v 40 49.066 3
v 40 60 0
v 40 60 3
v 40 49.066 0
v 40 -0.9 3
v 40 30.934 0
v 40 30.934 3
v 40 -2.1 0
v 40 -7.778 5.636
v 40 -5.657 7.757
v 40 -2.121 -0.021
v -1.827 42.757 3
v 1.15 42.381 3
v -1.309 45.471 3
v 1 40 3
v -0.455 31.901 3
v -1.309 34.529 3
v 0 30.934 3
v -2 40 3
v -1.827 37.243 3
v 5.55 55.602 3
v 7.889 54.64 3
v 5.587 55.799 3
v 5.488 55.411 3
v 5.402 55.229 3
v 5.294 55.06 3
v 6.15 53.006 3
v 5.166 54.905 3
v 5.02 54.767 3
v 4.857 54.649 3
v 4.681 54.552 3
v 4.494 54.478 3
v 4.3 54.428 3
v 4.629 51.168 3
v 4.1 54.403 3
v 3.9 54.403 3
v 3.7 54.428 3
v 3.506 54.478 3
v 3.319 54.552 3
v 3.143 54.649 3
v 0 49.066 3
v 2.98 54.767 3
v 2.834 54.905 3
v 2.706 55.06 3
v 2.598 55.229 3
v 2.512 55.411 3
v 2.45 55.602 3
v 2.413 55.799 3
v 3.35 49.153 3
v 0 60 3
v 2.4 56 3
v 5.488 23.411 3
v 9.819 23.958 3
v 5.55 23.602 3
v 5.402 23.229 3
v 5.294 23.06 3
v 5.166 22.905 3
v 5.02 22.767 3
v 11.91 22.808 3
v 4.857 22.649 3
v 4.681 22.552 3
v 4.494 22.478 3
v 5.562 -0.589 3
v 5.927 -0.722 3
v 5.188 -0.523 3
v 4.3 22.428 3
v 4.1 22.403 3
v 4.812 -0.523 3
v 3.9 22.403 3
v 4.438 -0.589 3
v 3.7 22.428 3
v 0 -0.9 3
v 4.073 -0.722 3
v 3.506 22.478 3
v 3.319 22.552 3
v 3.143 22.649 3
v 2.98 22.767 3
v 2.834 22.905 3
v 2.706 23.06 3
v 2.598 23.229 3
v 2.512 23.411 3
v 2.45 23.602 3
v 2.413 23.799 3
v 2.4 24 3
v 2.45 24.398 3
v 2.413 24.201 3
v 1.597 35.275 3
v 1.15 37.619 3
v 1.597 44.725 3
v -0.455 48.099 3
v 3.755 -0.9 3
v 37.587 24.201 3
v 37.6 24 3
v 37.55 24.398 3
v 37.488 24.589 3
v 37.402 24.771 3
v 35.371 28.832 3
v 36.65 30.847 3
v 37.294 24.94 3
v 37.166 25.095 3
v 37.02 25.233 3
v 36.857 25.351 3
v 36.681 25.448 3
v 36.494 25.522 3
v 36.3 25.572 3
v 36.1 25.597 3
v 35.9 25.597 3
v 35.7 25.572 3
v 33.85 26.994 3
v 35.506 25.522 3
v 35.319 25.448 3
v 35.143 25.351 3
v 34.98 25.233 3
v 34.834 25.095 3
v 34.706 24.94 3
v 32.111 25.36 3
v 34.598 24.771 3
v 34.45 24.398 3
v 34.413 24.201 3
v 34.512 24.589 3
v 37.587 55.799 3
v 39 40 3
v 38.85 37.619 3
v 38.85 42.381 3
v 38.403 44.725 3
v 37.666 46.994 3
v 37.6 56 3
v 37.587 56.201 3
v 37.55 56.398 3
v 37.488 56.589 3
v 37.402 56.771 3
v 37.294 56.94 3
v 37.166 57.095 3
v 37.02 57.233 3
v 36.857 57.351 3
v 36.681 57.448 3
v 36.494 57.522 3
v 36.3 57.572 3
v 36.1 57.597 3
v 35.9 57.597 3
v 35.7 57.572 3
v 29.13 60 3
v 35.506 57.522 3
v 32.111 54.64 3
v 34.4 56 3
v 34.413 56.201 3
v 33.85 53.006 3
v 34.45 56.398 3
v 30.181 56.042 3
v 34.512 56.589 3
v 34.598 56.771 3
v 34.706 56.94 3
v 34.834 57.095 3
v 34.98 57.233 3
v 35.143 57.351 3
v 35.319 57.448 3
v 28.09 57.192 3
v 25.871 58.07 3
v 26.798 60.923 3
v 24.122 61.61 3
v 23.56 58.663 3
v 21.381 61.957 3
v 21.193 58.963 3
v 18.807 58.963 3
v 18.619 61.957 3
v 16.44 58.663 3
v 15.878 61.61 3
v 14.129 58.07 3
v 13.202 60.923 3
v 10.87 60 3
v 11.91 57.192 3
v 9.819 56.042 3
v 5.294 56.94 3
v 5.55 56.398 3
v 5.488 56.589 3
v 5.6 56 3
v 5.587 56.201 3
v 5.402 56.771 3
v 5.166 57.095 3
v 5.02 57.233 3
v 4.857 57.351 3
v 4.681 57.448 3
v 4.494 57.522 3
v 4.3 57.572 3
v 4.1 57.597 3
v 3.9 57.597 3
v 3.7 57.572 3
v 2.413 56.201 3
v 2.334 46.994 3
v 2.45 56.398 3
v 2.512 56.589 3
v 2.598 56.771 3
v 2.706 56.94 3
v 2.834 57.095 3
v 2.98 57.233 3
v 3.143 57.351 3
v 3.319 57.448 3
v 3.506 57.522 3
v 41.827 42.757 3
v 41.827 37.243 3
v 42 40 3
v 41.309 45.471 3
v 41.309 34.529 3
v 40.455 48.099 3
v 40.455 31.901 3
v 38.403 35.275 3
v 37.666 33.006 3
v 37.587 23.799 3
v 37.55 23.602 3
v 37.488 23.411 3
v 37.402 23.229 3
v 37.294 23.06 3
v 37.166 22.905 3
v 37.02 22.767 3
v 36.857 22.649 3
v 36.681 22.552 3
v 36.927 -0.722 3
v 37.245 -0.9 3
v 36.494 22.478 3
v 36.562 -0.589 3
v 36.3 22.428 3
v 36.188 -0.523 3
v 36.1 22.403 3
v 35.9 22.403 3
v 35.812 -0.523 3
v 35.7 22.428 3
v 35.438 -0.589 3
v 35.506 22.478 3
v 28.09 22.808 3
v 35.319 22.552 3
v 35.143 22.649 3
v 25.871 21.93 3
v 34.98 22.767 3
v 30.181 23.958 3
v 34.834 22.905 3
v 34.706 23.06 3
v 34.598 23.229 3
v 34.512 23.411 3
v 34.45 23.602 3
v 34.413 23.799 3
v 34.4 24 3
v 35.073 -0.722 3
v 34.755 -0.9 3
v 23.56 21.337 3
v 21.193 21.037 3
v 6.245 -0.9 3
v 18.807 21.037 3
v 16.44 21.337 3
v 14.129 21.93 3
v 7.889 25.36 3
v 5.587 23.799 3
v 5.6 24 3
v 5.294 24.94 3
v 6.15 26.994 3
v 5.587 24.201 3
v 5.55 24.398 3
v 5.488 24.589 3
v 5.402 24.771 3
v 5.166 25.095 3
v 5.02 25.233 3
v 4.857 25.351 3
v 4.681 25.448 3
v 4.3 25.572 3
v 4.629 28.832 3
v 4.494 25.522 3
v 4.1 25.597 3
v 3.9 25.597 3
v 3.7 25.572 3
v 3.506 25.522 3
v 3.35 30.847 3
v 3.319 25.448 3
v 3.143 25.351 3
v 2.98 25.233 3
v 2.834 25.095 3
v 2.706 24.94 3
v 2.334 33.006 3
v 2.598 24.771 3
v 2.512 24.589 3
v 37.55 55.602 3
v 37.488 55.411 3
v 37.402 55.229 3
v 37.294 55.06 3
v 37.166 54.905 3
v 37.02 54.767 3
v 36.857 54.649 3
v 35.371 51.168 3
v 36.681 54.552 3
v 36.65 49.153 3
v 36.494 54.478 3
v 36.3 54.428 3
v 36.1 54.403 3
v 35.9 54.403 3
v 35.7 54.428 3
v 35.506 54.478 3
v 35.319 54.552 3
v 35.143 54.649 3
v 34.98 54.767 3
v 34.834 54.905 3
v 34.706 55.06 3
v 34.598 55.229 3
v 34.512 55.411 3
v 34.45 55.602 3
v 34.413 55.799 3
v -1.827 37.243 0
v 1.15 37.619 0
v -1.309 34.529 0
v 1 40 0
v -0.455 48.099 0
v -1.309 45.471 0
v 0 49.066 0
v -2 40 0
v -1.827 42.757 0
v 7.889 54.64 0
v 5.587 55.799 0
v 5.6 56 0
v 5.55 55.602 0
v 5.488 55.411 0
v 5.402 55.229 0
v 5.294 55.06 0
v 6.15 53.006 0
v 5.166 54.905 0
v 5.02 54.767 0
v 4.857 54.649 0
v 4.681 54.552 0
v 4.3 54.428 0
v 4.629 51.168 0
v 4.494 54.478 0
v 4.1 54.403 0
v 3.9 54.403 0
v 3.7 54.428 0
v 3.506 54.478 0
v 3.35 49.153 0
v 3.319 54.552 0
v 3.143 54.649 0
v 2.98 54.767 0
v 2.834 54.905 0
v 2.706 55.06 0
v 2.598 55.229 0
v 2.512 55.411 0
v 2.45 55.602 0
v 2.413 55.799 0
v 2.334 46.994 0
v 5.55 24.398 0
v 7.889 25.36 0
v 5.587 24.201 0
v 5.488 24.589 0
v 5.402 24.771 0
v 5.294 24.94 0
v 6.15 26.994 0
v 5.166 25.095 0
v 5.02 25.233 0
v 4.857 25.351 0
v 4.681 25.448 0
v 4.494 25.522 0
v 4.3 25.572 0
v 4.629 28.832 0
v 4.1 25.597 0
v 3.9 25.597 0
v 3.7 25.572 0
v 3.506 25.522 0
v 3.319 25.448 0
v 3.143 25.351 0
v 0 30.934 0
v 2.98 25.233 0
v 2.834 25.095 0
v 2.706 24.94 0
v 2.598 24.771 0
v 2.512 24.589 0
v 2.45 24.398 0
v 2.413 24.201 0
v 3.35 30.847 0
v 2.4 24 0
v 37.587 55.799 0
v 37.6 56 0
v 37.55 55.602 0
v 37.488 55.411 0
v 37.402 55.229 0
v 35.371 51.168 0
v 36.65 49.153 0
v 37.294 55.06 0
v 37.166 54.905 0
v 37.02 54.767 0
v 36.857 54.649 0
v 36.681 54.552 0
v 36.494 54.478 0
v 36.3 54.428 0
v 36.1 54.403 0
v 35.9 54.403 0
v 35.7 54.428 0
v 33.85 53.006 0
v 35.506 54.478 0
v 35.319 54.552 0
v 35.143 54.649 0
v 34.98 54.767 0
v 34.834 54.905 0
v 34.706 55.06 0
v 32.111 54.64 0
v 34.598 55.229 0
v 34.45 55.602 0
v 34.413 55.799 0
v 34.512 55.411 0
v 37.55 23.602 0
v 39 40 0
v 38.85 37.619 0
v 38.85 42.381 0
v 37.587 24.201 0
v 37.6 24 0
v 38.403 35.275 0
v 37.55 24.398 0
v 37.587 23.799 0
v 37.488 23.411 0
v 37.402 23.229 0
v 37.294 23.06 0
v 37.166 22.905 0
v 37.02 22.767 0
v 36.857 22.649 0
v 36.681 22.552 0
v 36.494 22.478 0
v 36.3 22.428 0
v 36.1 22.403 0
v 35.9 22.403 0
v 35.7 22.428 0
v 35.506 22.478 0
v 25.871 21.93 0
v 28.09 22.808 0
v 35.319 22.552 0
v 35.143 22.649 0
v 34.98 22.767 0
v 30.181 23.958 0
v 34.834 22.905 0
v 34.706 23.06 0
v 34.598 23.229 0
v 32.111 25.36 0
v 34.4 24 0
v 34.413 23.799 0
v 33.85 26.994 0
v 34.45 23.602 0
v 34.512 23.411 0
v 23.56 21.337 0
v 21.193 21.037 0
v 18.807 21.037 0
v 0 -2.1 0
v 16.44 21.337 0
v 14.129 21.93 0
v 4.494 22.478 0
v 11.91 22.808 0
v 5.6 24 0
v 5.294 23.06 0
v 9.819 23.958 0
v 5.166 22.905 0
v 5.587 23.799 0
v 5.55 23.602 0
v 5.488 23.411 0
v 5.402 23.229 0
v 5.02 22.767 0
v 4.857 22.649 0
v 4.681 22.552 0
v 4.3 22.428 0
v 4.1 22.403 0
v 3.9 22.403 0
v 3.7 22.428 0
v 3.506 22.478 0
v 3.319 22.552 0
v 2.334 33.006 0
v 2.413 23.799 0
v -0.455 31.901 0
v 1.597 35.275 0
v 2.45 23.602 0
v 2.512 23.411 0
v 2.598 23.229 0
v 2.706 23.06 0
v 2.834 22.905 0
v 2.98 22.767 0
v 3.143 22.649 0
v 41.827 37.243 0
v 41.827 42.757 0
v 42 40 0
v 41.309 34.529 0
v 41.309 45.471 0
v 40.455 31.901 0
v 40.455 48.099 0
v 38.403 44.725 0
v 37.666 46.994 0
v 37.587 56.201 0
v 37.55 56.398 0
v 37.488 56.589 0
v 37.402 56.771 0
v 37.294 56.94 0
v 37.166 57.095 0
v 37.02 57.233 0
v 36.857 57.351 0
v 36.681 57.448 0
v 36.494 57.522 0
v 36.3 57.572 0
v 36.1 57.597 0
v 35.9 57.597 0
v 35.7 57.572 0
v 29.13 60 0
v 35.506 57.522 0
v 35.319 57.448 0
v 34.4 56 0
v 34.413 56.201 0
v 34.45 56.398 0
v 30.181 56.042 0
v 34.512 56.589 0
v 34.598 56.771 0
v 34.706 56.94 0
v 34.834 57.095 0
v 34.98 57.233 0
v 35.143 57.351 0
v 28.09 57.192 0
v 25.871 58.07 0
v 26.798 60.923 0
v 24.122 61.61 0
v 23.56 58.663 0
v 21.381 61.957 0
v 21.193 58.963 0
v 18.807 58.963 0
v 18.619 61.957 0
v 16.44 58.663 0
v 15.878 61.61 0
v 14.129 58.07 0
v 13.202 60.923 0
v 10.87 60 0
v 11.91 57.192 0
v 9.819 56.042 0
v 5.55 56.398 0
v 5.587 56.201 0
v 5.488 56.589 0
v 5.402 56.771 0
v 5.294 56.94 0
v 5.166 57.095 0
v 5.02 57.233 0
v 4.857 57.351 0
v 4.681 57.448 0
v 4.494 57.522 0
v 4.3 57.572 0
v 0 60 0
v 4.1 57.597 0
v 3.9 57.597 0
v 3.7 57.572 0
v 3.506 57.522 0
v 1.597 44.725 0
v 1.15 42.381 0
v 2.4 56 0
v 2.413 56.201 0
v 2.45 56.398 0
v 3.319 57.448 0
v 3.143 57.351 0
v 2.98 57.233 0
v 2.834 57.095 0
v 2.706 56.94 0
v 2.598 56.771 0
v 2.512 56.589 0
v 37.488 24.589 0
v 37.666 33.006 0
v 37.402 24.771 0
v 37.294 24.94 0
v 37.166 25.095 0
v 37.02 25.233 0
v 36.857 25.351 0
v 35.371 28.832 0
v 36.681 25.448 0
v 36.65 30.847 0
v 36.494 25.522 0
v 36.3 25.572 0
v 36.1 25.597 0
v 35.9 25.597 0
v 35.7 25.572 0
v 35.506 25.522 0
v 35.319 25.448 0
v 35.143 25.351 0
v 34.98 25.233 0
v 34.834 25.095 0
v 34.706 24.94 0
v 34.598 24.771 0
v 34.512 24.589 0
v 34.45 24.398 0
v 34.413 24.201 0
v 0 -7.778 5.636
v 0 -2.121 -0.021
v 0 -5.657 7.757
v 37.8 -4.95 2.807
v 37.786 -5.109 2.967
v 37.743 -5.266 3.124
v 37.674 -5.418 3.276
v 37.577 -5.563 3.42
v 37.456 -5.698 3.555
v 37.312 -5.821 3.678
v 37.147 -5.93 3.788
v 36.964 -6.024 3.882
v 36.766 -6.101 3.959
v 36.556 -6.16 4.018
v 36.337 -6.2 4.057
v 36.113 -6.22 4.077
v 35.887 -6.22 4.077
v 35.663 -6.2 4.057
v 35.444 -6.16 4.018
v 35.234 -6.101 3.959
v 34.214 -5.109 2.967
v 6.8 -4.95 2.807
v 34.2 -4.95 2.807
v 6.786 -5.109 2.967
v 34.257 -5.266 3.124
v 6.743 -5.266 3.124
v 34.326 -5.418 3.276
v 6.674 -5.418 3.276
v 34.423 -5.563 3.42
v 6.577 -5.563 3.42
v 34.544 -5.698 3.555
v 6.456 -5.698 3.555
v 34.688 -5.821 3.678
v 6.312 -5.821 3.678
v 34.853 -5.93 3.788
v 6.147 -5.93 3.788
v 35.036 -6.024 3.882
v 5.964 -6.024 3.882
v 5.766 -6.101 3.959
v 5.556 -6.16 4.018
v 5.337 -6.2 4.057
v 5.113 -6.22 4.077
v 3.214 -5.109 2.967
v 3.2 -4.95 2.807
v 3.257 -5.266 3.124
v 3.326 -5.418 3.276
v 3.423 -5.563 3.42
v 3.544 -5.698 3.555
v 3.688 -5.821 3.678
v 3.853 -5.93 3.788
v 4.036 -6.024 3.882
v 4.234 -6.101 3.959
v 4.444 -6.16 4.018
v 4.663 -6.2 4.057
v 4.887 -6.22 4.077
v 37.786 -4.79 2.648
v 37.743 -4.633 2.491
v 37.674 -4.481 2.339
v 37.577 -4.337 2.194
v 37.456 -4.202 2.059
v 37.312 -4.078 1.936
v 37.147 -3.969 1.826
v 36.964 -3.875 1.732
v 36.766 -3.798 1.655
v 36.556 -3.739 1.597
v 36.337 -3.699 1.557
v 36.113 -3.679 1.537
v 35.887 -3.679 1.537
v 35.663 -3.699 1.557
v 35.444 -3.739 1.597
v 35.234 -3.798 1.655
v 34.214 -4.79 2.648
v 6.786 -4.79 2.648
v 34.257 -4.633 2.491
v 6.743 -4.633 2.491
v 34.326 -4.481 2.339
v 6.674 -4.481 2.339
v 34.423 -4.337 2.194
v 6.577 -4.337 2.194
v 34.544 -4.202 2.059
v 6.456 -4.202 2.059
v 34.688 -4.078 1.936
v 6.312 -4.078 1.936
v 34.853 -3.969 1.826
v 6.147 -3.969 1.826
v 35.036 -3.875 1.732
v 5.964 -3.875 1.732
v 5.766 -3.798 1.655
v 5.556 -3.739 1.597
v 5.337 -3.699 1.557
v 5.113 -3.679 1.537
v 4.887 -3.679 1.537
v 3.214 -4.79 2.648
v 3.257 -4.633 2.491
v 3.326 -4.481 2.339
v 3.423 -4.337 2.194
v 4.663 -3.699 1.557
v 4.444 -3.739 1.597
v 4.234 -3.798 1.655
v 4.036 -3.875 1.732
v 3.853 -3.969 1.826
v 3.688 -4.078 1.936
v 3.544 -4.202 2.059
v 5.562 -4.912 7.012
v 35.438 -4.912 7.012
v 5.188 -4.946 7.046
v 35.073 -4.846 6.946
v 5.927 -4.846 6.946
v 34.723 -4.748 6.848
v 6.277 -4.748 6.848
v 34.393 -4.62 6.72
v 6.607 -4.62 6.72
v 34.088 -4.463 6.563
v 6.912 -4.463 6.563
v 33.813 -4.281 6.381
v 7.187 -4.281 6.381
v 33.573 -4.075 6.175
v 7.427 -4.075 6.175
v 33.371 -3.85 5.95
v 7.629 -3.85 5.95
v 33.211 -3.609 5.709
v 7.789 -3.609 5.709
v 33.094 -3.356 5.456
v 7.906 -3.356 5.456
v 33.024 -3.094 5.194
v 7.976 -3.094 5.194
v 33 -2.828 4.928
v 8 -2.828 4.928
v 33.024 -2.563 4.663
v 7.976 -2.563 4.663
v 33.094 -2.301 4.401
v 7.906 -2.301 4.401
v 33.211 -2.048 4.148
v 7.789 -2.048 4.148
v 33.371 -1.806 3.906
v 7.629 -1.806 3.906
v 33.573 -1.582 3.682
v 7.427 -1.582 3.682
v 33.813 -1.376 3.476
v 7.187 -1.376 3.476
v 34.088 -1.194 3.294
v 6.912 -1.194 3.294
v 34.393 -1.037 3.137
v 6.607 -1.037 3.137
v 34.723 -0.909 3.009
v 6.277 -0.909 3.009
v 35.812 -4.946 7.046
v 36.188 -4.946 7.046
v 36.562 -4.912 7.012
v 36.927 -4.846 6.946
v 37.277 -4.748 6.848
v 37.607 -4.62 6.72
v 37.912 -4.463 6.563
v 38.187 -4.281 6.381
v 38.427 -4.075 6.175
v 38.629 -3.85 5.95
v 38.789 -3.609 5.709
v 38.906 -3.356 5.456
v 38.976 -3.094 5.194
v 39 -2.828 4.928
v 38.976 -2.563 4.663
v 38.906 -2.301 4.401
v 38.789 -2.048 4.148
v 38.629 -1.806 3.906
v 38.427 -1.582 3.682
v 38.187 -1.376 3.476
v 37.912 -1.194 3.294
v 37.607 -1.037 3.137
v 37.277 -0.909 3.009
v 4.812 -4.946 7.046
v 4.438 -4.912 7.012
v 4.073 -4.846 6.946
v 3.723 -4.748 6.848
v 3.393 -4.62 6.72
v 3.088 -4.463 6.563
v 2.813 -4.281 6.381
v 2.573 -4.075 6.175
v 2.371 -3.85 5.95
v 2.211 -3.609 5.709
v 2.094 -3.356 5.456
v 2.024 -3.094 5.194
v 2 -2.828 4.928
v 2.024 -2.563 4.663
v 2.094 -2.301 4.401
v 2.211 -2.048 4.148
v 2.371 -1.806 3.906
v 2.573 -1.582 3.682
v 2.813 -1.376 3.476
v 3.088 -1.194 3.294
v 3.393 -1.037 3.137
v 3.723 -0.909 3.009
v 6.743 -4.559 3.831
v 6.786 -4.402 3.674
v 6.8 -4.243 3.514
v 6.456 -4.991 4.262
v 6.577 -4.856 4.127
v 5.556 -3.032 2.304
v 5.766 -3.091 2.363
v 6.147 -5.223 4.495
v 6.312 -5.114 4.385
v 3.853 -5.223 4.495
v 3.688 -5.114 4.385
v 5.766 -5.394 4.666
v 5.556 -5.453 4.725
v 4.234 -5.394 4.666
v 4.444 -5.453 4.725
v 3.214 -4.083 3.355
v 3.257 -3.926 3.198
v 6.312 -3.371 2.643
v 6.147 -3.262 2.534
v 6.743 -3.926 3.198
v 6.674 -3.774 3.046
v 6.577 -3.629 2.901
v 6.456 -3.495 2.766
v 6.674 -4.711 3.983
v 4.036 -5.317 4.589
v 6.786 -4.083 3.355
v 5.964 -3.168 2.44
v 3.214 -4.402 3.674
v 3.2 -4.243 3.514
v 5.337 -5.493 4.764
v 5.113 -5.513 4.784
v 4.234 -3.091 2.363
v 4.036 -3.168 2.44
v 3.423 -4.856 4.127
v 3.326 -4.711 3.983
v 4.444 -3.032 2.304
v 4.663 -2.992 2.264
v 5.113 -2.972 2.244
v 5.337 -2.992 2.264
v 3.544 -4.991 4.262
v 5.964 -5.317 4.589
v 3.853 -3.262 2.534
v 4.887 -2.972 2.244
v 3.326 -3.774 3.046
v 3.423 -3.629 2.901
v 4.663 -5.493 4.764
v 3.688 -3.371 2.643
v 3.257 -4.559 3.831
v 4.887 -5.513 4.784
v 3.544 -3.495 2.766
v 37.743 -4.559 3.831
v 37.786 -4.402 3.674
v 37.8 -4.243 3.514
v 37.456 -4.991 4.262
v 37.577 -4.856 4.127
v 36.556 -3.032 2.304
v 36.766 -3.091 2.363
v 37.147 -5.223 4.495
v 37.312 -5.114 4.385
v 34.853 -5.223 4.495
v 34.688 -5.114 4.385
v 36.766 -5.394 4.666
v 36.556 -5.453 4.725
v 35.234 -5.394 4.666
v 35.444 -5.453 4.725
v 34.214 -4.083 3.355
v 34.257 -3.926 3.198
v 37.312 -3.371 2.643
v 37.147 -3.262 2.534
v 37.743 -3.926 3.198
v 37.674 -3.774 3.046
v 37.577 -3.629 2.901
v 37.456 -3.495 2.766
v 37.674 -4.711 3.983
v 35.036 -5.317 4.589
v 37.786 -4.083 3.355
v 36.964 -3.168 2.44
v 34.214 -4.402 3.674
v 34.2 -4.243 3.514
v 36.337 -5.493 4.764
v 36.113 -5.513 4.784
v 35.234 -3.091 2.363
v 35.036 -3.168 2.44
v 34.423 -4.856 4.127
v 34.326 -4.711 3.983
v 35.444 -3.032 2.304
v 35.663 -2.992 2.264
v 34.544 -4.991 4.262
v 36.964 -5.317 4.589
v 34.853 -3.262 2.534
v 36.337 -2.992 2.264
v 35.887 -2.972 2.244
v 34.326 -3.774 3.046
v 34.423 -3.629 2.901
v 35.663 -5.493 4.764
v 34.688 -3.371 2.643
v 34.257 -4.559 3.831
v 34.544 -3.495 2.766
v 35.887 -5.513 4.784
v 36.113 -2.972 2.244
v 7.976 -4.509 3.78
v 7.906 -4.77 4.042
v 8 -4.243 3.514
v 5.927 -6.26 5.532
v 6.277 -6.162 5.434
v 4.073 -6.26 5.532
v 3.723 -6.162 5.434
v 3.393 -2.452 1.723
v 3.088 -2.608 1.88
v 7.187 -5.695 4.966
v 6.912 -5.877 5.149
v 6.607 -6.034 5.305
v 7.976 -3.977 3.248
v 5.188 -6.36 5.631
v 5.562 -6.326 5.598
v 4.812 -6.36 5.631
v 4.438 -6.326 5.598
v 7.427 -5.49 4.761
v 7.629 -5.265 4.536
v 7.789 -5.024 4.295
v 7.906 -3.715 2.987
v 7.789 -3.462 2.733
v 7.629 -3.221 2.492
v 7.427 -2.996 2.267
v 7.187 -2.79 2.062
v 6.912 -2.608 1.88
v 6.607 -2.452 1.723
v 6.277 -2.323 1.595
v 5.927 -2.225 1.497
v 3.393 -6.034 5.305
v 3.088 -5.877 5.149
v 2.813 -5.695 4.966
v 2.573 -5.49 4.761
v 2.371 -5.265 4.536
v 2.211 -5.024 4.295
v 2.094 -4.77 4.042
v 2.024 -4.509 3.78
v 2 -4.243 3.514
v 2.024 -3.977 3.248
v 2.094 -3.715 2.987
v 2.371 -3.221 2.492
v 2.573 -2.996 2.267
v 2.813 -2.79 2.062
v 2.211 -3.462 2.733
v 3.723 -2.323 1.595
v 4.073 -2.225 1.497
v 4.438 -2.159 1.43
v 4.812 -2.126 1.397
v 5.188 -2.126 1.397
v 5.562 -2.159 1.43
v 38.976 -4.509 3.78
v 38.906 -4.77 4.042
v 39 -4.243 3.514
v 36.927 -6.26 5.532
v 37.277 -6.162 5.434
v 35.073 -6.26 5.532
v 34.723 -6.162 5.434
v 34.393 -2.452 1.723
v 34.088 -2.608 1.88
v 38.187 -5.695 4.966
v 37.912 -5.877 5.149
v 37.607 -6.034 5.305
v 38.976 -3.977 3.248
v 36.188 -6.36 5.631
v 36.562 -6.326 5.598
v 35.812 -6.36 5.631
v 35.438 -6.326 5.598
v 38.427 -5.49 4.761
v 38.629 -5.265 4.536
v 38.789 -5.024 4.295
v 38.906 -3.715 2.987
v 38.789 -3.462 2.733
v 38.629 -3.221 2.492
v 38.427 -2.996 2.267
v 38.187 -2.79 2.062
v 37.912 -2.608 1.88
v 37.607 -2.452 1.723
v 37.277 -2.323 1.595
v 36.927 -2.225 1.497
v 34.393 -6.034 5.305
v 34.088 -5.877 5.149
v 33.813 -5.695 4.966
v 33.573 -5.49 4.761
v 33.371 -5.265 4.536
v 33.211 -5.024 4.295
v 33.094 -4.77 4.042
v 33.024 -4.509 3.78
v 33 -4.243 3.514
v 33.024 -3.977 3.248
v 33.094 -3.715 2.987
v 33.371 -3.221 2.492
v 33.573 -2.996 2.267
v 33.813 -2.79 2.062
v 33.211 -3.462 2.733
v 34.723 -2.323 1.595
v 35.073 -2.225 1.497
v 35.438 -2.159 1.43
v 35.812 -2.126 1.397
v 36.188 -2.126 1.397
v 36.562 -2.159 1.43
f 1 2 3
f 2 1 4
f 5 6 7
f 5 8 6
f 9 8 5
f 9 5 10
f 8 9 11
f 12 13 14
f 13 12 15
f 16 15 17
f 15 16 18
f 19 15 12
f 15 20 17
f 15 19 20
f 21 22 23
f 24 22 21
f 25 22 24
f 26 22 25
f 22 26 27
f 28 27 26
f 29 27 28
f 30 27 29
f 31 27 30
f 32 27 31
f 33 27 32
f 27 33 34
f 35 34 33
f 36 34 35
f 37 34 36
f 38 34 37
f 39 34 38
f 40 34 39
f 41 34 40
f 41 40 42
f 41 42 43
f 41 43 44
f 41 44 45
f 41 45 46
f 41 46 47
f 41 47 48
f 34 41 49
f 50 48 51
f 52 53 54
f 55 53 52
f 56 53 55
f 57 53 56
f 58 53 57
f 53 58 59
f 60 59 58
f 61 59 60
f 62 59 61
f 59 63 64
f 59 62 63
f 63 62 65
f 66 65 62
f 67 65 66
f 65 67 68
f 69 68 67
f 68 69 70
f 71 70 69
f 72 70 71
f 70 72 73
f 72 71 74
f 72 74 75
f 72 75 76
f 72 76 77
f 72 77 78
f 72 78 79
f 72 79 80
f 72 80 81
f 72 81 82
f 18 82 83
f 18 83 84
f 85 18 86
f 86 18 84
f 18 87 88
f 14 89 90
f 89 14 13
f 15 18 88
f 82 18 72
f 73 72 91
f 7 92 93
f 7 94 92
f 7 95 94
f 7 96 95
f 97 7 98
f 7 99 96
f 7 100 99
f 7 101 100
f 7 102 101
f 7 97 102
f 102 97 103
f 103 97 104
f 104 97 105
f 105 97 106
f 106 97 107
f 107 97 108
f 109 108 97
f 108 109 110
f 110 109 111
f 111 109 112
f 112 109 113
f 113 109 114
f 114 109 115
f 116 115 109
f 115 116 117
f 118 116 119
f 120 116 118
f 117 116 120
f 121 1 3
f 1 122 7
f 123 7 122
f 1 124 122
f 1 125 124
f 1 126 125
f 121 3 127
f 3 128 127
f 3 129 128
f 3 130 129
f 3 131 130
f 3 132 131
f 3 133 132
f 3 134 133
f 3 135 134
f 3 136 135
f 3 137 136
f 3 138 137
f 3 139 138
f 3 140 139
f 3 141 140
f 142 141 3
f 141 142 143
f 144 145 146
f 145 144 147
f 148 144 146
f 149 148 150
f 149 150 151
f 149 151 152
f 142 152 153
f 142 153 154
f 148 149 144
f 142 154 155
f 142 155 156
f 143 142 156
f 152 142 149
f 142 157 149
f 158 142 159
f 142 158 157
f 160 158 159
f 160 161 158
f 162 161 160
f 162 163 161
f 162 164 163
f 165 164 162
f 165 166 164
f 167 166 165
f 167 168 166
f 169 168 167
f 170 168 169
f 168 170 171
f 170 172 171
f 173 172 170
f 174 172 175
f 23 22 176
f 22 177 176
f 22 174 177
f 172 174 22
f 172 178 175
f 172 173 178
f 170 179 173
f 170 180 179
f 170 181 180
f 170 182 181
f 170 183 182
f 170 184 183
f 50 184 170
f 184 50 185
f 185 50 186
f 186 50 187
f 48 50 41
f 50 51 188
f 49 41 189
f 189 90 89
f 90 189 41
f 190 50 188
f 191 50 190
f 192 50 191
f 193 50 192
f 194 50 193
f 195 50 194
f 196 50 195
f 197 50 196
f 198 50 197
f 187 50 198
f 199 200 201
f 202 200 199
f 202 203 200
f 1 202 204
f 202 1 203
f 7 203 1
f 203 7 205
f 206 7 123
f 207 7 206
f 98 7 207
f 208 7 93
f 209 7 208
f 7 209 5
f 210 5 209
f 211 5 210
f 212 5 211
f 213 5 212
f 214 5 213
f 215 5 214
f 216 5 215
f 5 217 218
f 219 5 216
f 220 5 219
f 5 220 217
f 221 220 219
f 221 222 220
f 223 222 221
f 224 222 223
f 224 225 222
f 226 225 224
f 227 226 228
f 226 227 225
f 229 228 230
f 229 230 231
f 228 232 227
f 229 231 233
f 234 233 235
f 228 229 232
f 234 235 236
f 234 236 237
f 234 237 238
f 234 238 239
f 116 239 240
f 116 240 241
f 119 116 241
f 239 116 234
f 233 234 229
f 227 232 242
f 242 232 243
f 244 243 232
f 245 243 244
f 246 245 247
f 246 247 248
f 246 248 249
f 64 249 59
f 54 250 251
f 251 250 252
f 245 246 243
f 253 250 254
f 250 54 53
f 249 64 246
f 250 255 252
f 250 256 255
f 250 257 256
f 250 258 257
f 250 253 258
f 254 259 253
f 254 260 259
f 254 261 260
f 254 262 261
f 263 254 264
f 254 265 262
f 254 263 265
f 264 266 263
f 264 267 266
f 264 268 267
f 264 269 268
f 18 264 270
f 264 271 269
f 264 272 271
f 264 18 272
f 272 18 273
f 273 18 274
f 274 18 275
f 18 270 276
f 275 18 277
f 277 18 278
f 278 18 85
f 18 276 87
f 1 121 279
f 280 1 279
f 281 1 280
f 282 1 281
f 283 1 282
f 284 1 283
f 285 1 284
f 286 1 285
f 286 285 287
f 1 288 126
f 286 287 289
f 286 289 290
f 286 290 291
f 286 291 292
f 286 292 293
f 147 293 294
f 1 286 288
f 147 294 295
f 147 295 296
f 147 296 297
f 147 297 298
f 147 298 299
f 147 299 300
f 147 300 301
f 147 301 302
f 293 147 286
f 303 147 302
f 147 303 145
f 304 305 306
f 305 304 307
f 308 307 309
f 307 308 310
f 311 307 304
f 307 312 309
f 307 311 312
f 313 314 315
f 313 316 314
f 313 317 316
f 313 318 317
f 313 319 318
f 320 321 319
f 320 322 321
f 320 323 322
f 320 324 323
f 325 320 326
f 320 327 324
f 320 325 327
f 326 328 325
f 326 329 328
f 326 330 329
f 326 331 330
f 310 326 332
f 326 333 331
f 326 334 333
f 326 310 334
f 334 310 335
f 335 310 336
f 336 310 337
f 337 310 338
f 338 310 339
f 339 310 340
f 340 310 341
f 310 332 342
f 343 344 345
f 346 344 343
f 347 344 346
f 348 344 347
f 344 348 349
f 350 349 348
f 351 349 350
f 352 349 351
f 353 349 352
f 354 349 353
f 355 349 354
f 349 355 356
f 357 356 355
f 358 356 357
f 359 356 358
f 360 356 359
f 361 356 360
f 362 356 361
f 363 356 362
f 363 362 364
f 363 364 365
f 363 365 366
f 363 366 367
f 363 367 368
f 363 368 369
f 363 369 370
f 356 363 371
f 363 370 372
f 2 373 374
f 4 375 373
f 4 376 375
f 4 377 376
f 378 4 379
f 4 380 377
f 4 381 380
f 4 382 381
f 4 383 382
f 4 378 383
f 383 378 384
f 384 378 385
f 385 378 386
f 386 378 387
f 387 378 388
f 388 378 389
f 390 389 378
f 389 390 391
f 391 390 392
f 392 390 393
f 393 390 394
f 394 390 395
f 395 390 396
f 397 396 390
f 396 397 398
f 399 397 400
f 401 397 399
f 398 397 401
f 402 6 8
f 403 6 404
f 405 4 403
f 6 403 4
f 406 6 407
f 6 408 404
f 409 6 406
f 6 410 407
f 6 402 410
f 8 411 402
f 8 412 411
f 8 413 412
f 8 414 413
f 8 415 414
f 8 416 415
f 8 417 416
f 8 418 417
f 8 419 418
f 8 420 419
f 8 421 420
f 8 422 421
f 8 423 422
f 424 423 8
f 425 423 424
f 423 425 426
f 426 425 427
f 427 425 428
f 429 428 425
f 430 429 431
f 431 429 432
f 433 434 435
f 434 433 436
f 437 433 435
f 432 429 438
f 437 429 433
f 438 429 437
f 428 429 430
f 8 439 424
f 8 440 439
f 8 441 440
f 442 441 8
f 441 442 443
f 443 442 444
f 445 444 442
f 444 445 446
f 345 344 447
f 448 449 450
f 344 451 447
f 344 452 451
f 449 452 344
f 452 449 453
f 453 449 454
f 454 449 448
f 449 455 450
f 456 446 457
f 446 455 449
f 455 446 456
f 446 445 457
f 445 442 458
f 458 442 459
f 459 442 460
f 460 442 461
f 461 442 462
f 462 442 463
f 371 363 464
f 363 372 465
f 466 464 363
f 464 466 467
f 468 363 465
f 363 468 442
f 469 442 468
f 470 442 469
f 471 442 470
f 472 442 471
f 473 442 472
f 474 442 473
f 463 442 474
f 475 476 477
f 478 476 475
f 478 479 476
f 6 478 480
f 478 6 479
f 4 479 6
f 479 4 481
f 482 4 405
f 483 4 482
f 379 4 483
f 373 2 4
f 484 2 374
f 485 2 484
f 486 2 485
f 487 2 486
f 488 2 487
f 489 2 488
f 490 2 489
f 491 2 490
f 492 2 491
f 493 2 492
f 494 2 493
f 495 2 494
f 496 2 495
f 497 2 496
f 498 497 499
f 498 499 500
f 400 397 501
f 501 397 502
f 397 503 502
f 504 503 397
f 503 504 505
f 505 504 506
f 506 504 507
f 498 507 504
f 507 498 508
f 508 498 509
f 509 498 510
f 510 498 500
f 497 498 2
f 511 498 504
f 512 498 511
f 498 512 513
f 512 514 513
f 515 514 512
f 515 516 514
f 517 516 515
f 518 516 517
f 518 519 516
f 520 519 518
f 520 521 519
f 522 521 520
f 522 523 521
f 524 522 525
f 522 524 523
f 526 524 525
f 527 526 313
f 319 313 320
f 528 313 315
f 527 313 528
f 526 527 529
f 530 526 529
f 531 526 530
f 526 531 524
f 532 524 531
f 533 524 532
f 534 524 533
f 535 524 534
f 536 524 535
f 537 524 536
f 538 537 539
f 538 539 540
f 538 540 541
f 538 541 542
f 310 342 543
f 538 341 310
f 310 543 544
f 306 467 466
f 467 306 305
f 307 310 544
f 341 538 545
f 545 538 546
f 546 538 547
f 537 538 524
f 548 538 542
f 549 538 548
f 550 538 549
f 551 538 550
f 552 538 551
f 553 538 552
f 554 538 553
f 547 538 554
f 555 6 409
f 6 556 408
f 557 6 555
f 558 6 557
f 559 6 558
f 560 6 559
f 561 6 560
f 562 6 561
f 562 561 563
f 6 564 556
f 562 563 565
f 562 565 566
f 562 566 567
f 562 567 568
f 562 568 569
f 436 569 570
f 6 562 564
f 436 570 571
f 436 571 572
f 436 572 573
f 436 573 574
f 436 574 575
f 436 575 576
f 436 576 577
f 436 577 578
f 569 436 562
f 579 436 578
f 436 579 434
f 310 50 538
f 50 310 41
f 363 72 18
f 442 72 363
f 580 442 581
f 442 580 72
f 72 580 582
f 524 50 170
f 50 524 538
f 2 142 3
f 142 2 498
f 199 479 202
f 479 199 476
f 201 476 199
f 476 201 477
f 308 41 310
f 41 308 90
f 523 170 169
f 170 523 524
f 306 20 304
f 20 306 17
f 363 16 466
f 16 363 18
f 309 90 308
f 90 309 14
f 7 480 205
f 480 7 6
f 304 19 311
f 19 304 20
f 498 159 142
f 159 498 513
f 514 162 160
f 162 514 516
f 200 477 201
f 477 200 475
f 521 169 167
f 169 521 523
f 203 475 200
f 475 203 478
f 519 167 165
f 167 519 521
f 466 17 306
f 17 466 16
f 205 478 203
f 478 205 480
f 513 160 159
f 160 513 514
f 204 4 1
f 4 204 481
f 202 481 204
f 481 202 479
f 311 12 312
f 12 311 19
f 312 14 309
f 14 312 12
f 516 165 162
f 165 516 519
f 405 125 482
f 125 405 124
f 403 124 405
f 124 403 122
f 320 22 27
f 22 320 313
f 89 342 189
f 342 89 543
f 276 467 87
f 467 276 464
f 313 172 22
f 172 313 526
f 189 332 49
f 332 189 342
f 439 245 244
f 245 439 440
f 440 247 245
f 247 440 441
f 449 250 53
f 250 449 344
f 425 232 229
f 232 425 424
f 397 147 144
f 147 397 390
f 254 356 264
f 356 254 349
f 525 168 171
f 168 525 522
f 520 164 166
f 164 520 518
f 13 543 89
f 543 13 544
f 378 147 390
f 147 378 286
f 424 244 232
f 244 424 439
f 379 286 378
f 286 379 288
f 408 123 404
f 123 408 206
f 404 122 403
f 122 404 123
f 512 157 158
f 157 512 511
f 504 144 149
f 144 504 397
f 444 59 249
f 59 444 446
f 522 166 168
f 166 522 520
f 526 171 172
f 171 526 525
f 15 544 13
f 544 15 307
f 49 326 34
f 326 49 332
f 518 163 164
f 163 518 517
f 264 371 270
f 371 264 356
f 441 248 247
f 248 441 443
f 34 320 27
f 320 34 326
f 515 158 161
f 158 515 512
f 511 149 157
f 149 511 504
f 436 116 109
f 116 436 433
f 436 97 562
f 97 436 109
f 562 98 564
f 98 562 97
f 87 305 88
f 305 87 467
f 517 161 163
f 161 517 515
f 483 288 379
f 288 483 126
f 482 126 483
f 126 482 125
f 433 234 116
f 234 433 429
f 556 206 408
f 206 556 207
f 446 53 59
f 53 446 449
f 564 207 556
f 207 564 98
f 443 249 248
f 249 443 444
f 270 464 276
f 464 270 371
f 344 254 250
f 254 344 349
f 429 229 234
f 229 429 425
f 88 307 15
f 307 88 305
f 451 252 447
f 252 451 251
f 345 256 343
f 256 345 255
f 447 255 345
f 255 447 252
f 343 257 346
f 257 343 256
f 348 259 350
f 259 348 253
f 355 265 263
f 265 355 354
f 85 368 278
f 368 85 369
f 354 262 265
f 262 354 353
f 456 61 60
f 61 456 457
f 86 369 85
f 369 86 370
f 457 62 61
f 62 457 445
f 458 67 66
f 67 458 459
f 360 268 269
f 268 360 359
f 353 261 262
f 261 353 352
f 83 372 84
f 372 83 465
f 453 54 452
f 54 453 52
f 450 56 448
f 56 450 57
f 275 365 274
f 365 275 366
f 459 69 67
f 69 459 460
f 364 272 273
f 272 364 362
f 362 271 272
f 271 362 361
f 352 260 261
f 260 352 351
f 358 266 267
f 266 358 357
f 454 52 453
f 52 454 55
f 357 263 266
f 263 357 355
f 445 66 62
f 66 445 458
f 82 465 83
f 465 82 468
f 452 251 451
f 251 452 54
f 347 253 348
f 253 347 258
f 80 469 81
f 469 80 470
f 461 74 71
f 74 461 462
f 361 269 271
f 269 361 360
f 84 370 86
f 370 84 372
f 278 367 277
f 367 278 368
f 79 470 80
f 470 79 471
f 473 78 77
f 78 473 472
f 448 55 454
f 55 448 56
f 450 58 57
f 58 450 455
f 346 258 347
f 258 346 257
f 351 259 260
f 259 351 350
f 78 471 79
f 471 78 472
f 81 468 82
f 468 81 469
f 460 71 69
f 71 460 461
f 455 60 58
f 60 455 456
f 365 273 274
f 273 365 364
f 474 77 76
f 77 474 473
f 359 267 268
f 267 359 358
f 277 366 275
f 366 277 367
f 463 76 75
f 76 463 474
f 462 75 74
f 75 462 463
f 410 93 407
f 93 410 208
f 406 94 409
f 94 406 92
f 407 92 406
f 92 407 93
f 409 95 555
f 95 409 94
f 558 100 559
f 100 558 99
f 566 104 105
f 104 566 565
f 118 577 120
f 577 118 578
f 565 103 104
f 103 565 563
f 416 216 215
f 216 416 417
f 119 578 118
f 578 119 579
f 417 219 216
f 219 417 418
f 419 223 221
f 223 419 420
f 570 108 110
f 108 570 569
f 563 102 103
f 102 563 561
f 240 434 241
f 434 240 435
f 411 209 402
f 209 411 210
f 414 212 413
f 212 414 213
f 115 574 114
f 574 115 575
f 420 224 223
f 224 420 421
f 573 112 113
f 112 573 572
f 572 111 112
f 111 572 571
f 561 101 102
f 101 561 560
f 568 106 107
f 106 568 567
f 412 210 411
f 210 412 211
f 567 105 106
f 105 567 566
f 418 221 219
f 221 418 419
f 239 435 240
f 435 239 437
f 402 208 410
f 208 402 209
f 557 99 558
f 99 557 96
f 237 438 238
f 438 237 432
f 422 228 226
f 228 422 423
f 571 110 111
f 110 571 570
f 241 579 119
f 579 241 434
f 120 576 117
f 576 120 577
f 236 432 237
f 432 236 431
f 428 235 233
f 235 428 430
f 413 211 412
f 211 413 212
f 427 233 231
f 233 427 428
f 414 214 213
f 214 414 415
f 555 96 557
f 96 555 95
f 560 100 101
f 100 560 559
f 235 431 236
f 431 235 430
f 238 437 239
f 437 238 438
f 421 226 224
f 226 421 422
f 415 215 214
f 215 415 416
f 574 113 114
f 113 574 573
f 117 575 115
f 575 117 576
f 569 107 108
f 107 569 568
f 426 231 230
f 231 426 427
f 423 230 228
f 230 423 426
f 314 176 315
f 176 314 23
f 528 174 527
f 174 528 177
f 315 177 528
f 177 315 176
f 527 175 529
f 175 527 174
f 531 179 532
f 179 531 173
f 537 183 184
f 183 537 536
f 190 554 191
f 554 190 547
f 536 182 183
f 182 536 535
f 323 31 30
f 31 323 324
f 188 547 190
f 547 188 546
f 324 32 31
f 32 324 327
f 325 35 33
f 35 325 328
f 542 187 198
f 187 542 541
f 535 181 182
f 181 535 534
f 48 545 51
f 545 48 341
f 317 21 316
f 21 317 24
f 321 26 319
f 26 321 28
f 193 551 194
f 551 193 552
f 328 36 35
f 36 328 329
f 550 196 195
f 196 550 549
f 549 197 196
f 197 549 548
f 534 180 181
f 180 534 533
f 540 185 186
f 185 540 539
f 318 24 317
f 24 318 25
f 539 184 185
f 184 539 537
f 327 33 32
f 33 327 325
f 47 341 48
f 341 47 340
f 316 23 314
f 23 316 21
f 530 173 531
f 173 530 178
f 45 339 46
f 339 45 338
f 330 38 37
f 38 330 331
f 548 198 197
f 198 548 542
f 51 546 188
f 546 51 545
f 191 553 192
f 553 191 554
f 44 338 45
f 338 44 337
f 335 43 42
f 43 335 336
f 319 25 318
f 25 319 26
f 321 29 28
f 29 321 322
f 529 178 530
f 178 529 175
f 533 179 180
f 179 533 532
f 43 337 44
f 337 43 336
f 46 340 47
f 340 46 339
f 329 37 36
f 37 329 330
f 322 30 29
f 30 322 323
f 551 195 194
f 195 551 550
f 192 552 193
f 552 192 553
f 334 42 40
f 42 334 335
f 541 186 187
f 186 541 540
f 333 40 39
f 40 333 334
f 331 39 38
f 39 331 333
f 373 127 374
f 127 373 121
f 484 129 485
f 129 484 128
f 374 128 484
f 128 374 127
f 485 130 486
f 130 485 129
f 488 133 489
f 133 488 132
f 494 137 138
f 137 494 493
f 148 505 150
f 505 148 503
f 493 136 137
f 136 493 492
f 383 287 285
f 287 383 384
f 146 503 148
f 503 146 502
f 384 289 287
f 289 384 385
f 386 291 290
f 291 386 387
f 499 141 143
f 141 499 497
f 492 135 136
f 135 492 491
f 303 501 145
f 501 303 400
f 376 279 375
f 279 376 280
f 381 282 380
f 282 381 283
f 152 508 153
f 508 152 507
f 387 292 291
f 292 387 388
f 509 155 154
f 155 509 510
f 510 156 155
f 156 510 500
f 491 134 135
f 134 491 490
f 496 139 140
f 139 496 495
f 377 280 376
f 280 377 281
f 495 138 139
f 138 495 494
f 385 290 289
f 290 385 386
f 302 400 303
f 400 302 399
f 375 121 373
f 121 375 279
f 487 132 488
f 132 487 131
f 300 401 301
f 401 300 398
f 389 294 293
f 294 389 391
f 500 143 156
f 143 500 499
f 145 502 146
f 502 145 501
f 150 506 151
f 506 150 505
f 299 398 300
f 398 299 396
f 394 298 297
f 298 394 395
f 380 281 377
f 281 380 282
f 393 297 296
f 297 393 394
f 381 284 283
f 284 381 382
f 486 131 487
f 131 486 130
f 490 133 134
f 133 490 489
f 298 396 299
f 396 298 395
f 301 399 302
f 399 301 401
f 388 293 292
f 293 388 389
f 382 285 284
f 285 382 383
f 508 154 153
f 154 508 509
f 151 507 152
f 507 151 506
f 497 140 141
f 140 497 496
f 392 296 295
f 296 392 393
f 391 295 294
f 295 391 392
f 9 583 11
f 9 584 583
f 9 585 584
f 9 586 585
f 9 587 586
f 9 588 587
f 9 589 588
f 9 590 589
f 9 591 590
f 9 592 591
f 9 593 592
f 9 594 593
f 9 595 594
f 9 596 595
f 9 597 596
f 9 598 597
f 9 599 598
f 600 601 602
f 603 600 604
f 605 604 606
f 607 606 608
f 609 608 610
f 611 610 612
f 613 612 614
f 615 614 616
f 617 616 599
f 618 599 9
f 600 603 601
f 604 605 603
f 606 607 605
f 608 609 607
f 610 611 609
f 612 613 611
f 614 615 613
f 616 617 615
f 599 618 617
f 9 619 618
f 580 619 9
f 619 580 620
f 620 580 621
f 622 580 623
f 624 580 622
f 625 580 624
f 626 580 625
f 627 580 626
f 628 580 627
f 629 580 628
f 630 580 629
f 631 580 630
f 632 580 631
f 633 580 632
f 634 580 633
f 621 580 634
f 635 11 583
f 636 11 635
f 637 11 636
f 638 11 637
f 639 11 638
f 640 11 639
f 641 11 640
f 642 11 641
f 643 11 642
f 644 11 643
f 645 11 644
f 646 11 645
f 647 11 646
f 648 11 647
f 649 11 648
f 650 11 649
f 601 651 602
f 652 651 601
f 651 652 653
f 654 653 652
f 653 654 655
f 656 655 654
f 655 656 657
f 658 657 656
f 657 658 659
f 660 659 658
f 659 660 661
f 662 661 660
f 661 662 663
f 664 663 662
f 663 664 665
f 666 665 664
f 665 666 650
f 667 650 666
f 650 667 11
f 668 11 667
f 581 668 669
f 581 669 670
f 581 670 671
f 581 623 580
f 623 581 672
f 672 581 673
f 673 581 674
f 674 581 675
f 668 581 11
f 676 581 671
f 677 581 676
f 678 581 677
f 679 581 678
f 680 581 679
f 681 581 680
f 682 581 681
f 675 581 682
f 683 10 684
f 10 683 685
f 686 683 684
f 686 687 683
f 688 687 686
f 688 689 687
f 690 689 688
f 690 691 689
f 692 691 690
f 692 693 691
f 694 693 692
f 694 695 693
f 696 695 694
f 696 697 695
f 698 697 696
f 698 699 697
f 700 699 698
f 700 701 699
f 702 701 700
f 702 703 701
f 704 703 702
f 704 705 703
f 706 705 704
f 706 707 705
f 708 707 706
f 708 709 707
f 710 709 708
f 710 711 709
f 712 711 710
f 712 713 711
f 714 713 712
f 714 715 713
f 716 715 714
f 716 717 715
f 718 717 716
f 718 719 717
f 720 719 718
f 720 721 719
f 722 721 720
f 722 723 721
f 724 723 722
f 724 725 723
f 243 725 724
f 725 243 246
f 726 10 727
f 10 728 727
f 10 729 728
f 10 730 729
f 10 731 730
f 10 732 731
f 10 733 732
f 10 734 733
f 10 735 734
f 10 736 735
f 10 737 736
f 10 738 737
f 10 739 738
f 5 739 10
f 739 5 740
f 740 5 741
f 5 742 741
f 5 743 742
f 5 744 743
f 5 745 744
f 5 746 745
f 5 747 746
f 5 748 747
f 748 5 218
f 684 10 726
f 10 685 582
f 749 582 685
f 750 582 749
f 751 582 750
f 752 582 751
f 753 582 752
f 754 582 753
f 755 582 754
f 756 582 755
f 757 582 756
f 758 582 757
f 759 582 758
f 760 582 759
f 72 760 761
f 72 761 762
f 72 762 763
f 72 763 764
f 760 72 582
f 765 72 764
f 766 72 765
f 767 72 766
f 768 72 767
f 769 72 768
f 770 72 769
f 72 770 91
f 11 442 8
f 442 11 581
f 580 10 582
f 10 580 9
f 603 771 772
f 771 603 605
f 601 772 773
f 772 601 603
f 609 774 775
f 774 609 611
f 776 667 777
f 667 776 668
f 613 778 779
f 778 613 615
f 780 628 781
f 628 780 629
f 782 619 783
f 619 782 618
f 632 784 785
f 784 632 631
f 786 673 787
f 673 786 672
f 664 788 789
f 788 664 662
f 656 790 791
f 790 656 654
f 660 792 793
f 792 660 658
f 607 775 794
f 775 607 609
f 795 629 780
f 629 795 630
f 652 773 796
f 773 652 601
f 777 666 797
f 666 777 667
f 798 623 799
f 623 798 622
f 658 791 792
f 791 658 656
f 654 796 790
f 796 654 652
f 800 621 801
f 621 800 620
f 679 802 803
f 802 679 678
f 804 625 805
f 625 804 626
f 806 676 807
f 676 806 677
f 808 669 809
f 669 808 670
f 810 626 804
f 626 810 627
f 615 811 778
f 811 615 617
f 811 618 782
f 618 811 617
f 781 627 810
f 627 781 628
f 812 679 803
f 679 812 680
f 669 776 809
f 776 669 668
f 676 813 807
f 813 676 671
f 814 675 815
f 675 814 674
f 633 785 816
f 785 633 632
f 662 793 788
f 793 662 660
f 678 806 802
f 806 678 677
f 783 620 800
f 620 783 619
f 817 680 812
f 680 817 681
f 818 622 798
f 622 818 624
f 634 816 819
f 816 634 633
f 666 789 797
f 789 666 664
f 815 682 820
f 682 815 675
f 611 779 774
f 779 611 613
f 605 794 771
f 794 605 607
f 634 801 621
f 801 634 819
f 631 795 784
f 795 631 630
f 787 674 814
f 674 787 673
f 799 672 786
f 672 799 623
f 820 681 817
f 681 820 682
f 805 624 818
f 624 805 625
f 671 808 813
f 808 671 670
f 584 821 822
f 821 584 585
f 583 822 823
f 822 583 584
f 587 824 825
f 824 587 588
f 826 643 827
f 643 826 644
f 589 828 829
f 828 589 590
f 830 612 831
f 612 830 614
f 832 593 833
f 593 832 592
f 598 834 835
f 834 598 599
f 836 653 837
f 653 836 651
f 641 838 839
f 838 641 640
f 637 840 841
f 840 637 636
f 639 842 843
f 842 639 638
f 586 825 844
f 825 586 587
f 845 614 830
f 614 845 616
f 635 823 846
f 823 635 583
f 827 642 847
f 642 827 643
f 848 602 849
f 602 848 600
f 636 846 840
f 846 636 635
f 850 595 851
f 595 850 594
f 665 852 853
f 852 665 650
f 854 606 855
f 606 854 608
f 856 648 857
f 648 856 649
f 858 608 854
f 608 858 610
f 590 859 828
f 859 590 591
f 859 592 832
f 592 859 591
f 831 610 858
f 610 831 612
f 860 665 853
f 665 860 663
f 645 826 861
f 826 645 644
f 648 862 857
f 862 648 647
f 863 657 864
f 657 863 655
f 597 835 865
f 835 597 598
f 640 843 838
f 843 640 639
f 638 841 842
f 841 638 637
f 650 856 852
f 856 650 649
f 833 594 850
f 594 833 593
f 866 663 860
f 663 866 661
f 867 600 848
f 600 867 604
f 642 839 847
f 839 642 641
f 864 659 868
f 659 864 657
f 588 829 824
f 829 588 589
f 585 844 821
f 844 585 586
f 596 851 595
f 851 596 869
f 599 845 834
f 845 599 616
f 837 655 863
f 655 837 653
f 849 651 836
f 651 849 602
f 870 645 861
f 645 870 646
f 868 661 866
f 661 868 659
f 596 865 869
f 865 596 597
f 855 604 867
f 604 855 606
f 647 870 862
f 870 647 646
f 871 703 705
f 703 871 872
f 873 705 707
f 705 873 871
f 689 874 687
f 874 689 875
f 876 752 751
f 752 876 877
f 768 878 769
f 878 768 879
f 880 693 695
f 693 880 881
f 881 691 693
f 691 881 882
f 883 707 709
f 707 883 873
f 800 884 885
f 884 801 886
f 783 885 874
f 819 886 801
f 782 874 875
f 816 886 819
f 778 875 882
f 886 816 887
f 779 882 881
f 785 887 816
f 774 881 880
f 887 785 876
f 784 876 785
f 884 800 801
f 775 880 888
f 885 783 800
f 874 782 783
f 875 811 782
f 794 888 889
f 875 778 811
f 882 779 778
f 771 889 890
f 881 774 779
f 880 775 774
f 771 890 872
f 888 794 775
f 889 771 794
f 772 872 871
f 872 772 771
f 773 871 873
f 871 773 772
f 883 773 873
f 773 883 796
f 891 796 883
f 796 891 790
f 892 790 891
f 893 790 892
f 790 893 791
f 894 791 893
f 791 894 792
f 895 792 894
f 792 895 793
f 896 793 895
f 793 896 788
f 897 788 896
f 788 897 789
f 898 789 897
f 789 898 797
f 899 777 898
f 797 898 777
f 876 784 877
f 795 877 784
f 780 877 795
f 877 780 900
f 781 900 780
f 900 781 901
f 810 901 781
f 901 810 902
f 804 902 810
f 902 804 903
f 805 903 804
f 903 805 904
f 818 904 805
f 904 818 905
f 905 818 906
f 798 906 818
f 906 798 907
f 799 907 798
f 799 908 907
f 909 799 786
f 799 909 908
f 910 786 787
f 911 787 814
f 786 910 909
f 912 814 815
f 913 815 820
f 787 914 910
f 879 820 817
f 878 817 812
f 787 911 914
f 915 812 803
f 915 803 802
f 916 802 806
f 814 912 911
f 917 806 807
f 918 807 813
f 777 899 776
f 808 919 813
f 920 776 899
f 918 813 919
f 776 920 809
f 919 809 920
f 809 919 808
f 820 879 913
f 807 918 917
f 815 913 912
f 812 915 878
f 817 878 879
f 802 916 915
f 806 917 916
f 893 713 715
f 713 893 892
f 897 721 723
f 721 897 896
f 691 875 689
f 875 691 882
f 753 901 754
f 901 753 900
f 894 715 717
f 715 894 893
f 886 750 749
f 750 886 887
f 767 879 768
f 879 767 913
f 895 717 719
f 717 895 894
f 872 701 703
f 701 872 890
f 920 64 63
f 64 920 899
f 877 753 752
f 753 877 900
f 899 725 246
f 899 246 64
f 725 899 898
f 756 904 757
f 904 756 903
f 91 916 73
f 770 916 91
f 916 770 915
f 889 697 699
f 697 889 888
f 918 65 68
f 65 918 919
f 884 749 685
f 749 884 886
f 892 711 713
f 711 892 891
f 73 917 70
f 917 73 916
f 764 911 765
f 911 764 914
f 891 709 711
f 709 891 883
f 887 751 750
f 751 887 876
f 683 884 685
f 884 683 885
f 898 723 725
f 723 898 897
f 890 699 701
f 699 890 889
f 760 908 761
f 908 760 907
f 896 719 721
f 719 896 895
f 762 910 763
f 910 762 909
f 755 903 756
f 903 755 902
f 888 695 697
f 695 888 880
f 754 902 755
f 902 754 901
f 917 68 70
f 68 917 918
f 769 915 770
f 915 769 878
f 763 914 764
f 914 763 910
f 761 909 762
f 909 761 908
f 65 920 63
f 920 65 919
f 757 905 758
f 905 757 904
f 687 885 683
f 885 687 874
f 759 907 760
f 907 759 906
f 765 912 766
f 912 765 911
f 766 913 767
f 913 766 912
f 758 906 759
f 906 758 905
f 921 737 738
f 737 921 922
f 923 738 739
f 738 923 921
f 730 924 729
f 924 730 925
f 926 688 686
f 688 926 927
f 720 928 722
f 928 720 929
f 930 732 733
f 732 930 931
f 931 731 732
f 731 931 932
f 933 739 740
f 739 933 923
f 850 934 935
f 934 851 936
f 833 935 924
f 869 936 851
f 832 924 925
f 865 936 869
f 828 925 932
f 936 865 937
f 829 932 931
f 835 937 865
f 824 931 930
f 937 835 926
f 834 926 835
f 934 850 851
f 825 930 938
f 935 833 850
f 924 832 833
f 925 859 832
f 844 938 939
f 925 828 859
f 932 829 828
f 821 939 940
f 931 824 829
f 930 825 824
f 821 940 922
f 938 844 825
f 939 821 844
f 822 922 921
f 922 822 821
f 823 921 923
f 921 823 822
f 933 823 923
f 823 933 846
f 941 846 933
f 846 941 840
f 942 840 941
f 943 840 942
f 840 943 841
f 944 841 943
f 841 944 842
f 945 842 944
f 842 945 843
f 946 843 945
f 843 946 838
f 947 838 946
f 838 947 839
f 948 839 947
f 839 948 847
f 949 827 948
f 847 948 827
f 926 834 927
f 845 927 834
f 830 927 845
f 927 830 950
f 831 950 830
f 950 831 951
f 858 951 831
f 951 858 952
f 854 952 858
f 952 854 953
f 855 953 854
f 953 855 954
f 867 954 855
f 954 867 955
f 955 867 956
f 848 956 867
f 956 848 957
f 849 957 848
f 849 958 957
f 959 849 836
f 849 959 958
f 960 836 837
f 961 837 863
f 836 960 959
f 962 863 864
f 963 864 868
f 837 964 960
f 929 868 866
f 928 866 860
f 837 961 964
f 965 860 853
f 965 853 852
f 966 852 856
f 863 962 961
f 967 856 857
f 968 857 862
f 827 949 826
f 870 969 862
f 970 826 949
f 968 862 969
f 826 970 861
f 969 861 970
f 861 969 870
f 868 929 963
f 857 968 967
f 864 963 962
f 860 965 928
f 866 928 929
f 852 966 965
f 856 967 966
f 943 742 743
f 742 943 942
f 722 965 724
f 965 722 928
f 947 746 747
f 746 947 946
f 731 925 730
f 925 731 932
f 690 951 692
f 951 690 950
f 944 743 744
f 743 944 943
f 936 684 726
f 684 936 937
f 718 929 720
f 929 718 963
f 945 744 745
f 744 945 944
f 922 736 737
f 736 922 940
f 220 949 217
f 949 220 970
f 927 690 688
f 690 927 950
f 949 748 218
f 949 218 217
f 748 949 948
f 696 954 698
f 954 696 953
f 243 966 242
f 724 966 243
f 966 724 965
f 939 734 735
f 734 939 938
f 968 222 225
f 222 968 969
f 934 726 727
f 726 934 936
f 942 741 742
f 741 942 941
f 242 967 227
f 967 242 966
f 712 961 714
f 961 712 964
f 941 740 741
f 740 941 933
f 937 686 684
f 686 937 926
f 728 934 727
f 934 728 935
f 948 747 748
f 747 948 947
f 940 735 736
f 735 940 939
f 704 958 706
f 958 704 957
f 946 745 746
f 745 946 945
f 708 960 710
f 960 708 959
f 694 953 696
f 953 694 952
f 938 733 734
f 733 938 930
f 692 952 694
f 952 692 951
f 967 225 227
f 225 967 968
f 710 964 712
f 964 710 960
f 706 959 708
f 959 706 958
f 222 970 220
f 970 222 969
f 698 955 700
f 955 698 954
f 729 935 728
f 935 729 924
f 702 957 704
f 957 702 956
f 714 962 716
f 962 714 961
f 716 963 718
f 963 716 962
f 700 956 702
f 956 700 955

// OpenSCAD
$fn=50;

enlong = 20;

rad = 1.6;

//sak();

module enlongate()
{
  cube([40,enlong,3]);
}

enlongate();

translate([0,enlong,0])
sak();

difference()
{

union()
{
translate([0,-2.1,0])
cube([40,3,3]);


translate([0,0,2.1])
rotate([45+90,0,0])

cube([40,8,3]);
//sak();
}

translate([0,0,2.1])
rotate([45+90,0,0])

union()
{
translate([5,4,-1])
cylinder(r=1.8, h=10);

translate([31+5,4,-1])
cylinder(r=1.8, h=10);

translate([5,4,-1])
cylinder(r=3, h=3);

translate([31+5,4,-1])
cylinder(r=3, h=3);


}
}


/*
hull()
{
translate([5,5,0])
cylinder(r=5,h=3);
translate([31+5,5,0])
cylinder(r=5,h=3);
}
*/


//translate([0,0,0])
//rotate([90,0,0])

module sak()
{
union()
{
difference()
{
  union()
  {
    cube([40,40,3]);
    translate([20,20,0])
    cylinder(r=22,h=3);
  }

  union()
  {
    translate([20,20,-.1])
    cylinder(r=19,h=4.1);

    translate([4,4,-.1])
    cylinder(r=rad,h=5);

    translate([32+4,4,-.1])
    cylinder(r=rad,h=5);

    translate([4,32+4,-.1])
    cylinder(r=rad,h=5);

    translate([32+4,32+4,-.1])
    cylinder(r=rad,h=5);
  }
}
}
}
